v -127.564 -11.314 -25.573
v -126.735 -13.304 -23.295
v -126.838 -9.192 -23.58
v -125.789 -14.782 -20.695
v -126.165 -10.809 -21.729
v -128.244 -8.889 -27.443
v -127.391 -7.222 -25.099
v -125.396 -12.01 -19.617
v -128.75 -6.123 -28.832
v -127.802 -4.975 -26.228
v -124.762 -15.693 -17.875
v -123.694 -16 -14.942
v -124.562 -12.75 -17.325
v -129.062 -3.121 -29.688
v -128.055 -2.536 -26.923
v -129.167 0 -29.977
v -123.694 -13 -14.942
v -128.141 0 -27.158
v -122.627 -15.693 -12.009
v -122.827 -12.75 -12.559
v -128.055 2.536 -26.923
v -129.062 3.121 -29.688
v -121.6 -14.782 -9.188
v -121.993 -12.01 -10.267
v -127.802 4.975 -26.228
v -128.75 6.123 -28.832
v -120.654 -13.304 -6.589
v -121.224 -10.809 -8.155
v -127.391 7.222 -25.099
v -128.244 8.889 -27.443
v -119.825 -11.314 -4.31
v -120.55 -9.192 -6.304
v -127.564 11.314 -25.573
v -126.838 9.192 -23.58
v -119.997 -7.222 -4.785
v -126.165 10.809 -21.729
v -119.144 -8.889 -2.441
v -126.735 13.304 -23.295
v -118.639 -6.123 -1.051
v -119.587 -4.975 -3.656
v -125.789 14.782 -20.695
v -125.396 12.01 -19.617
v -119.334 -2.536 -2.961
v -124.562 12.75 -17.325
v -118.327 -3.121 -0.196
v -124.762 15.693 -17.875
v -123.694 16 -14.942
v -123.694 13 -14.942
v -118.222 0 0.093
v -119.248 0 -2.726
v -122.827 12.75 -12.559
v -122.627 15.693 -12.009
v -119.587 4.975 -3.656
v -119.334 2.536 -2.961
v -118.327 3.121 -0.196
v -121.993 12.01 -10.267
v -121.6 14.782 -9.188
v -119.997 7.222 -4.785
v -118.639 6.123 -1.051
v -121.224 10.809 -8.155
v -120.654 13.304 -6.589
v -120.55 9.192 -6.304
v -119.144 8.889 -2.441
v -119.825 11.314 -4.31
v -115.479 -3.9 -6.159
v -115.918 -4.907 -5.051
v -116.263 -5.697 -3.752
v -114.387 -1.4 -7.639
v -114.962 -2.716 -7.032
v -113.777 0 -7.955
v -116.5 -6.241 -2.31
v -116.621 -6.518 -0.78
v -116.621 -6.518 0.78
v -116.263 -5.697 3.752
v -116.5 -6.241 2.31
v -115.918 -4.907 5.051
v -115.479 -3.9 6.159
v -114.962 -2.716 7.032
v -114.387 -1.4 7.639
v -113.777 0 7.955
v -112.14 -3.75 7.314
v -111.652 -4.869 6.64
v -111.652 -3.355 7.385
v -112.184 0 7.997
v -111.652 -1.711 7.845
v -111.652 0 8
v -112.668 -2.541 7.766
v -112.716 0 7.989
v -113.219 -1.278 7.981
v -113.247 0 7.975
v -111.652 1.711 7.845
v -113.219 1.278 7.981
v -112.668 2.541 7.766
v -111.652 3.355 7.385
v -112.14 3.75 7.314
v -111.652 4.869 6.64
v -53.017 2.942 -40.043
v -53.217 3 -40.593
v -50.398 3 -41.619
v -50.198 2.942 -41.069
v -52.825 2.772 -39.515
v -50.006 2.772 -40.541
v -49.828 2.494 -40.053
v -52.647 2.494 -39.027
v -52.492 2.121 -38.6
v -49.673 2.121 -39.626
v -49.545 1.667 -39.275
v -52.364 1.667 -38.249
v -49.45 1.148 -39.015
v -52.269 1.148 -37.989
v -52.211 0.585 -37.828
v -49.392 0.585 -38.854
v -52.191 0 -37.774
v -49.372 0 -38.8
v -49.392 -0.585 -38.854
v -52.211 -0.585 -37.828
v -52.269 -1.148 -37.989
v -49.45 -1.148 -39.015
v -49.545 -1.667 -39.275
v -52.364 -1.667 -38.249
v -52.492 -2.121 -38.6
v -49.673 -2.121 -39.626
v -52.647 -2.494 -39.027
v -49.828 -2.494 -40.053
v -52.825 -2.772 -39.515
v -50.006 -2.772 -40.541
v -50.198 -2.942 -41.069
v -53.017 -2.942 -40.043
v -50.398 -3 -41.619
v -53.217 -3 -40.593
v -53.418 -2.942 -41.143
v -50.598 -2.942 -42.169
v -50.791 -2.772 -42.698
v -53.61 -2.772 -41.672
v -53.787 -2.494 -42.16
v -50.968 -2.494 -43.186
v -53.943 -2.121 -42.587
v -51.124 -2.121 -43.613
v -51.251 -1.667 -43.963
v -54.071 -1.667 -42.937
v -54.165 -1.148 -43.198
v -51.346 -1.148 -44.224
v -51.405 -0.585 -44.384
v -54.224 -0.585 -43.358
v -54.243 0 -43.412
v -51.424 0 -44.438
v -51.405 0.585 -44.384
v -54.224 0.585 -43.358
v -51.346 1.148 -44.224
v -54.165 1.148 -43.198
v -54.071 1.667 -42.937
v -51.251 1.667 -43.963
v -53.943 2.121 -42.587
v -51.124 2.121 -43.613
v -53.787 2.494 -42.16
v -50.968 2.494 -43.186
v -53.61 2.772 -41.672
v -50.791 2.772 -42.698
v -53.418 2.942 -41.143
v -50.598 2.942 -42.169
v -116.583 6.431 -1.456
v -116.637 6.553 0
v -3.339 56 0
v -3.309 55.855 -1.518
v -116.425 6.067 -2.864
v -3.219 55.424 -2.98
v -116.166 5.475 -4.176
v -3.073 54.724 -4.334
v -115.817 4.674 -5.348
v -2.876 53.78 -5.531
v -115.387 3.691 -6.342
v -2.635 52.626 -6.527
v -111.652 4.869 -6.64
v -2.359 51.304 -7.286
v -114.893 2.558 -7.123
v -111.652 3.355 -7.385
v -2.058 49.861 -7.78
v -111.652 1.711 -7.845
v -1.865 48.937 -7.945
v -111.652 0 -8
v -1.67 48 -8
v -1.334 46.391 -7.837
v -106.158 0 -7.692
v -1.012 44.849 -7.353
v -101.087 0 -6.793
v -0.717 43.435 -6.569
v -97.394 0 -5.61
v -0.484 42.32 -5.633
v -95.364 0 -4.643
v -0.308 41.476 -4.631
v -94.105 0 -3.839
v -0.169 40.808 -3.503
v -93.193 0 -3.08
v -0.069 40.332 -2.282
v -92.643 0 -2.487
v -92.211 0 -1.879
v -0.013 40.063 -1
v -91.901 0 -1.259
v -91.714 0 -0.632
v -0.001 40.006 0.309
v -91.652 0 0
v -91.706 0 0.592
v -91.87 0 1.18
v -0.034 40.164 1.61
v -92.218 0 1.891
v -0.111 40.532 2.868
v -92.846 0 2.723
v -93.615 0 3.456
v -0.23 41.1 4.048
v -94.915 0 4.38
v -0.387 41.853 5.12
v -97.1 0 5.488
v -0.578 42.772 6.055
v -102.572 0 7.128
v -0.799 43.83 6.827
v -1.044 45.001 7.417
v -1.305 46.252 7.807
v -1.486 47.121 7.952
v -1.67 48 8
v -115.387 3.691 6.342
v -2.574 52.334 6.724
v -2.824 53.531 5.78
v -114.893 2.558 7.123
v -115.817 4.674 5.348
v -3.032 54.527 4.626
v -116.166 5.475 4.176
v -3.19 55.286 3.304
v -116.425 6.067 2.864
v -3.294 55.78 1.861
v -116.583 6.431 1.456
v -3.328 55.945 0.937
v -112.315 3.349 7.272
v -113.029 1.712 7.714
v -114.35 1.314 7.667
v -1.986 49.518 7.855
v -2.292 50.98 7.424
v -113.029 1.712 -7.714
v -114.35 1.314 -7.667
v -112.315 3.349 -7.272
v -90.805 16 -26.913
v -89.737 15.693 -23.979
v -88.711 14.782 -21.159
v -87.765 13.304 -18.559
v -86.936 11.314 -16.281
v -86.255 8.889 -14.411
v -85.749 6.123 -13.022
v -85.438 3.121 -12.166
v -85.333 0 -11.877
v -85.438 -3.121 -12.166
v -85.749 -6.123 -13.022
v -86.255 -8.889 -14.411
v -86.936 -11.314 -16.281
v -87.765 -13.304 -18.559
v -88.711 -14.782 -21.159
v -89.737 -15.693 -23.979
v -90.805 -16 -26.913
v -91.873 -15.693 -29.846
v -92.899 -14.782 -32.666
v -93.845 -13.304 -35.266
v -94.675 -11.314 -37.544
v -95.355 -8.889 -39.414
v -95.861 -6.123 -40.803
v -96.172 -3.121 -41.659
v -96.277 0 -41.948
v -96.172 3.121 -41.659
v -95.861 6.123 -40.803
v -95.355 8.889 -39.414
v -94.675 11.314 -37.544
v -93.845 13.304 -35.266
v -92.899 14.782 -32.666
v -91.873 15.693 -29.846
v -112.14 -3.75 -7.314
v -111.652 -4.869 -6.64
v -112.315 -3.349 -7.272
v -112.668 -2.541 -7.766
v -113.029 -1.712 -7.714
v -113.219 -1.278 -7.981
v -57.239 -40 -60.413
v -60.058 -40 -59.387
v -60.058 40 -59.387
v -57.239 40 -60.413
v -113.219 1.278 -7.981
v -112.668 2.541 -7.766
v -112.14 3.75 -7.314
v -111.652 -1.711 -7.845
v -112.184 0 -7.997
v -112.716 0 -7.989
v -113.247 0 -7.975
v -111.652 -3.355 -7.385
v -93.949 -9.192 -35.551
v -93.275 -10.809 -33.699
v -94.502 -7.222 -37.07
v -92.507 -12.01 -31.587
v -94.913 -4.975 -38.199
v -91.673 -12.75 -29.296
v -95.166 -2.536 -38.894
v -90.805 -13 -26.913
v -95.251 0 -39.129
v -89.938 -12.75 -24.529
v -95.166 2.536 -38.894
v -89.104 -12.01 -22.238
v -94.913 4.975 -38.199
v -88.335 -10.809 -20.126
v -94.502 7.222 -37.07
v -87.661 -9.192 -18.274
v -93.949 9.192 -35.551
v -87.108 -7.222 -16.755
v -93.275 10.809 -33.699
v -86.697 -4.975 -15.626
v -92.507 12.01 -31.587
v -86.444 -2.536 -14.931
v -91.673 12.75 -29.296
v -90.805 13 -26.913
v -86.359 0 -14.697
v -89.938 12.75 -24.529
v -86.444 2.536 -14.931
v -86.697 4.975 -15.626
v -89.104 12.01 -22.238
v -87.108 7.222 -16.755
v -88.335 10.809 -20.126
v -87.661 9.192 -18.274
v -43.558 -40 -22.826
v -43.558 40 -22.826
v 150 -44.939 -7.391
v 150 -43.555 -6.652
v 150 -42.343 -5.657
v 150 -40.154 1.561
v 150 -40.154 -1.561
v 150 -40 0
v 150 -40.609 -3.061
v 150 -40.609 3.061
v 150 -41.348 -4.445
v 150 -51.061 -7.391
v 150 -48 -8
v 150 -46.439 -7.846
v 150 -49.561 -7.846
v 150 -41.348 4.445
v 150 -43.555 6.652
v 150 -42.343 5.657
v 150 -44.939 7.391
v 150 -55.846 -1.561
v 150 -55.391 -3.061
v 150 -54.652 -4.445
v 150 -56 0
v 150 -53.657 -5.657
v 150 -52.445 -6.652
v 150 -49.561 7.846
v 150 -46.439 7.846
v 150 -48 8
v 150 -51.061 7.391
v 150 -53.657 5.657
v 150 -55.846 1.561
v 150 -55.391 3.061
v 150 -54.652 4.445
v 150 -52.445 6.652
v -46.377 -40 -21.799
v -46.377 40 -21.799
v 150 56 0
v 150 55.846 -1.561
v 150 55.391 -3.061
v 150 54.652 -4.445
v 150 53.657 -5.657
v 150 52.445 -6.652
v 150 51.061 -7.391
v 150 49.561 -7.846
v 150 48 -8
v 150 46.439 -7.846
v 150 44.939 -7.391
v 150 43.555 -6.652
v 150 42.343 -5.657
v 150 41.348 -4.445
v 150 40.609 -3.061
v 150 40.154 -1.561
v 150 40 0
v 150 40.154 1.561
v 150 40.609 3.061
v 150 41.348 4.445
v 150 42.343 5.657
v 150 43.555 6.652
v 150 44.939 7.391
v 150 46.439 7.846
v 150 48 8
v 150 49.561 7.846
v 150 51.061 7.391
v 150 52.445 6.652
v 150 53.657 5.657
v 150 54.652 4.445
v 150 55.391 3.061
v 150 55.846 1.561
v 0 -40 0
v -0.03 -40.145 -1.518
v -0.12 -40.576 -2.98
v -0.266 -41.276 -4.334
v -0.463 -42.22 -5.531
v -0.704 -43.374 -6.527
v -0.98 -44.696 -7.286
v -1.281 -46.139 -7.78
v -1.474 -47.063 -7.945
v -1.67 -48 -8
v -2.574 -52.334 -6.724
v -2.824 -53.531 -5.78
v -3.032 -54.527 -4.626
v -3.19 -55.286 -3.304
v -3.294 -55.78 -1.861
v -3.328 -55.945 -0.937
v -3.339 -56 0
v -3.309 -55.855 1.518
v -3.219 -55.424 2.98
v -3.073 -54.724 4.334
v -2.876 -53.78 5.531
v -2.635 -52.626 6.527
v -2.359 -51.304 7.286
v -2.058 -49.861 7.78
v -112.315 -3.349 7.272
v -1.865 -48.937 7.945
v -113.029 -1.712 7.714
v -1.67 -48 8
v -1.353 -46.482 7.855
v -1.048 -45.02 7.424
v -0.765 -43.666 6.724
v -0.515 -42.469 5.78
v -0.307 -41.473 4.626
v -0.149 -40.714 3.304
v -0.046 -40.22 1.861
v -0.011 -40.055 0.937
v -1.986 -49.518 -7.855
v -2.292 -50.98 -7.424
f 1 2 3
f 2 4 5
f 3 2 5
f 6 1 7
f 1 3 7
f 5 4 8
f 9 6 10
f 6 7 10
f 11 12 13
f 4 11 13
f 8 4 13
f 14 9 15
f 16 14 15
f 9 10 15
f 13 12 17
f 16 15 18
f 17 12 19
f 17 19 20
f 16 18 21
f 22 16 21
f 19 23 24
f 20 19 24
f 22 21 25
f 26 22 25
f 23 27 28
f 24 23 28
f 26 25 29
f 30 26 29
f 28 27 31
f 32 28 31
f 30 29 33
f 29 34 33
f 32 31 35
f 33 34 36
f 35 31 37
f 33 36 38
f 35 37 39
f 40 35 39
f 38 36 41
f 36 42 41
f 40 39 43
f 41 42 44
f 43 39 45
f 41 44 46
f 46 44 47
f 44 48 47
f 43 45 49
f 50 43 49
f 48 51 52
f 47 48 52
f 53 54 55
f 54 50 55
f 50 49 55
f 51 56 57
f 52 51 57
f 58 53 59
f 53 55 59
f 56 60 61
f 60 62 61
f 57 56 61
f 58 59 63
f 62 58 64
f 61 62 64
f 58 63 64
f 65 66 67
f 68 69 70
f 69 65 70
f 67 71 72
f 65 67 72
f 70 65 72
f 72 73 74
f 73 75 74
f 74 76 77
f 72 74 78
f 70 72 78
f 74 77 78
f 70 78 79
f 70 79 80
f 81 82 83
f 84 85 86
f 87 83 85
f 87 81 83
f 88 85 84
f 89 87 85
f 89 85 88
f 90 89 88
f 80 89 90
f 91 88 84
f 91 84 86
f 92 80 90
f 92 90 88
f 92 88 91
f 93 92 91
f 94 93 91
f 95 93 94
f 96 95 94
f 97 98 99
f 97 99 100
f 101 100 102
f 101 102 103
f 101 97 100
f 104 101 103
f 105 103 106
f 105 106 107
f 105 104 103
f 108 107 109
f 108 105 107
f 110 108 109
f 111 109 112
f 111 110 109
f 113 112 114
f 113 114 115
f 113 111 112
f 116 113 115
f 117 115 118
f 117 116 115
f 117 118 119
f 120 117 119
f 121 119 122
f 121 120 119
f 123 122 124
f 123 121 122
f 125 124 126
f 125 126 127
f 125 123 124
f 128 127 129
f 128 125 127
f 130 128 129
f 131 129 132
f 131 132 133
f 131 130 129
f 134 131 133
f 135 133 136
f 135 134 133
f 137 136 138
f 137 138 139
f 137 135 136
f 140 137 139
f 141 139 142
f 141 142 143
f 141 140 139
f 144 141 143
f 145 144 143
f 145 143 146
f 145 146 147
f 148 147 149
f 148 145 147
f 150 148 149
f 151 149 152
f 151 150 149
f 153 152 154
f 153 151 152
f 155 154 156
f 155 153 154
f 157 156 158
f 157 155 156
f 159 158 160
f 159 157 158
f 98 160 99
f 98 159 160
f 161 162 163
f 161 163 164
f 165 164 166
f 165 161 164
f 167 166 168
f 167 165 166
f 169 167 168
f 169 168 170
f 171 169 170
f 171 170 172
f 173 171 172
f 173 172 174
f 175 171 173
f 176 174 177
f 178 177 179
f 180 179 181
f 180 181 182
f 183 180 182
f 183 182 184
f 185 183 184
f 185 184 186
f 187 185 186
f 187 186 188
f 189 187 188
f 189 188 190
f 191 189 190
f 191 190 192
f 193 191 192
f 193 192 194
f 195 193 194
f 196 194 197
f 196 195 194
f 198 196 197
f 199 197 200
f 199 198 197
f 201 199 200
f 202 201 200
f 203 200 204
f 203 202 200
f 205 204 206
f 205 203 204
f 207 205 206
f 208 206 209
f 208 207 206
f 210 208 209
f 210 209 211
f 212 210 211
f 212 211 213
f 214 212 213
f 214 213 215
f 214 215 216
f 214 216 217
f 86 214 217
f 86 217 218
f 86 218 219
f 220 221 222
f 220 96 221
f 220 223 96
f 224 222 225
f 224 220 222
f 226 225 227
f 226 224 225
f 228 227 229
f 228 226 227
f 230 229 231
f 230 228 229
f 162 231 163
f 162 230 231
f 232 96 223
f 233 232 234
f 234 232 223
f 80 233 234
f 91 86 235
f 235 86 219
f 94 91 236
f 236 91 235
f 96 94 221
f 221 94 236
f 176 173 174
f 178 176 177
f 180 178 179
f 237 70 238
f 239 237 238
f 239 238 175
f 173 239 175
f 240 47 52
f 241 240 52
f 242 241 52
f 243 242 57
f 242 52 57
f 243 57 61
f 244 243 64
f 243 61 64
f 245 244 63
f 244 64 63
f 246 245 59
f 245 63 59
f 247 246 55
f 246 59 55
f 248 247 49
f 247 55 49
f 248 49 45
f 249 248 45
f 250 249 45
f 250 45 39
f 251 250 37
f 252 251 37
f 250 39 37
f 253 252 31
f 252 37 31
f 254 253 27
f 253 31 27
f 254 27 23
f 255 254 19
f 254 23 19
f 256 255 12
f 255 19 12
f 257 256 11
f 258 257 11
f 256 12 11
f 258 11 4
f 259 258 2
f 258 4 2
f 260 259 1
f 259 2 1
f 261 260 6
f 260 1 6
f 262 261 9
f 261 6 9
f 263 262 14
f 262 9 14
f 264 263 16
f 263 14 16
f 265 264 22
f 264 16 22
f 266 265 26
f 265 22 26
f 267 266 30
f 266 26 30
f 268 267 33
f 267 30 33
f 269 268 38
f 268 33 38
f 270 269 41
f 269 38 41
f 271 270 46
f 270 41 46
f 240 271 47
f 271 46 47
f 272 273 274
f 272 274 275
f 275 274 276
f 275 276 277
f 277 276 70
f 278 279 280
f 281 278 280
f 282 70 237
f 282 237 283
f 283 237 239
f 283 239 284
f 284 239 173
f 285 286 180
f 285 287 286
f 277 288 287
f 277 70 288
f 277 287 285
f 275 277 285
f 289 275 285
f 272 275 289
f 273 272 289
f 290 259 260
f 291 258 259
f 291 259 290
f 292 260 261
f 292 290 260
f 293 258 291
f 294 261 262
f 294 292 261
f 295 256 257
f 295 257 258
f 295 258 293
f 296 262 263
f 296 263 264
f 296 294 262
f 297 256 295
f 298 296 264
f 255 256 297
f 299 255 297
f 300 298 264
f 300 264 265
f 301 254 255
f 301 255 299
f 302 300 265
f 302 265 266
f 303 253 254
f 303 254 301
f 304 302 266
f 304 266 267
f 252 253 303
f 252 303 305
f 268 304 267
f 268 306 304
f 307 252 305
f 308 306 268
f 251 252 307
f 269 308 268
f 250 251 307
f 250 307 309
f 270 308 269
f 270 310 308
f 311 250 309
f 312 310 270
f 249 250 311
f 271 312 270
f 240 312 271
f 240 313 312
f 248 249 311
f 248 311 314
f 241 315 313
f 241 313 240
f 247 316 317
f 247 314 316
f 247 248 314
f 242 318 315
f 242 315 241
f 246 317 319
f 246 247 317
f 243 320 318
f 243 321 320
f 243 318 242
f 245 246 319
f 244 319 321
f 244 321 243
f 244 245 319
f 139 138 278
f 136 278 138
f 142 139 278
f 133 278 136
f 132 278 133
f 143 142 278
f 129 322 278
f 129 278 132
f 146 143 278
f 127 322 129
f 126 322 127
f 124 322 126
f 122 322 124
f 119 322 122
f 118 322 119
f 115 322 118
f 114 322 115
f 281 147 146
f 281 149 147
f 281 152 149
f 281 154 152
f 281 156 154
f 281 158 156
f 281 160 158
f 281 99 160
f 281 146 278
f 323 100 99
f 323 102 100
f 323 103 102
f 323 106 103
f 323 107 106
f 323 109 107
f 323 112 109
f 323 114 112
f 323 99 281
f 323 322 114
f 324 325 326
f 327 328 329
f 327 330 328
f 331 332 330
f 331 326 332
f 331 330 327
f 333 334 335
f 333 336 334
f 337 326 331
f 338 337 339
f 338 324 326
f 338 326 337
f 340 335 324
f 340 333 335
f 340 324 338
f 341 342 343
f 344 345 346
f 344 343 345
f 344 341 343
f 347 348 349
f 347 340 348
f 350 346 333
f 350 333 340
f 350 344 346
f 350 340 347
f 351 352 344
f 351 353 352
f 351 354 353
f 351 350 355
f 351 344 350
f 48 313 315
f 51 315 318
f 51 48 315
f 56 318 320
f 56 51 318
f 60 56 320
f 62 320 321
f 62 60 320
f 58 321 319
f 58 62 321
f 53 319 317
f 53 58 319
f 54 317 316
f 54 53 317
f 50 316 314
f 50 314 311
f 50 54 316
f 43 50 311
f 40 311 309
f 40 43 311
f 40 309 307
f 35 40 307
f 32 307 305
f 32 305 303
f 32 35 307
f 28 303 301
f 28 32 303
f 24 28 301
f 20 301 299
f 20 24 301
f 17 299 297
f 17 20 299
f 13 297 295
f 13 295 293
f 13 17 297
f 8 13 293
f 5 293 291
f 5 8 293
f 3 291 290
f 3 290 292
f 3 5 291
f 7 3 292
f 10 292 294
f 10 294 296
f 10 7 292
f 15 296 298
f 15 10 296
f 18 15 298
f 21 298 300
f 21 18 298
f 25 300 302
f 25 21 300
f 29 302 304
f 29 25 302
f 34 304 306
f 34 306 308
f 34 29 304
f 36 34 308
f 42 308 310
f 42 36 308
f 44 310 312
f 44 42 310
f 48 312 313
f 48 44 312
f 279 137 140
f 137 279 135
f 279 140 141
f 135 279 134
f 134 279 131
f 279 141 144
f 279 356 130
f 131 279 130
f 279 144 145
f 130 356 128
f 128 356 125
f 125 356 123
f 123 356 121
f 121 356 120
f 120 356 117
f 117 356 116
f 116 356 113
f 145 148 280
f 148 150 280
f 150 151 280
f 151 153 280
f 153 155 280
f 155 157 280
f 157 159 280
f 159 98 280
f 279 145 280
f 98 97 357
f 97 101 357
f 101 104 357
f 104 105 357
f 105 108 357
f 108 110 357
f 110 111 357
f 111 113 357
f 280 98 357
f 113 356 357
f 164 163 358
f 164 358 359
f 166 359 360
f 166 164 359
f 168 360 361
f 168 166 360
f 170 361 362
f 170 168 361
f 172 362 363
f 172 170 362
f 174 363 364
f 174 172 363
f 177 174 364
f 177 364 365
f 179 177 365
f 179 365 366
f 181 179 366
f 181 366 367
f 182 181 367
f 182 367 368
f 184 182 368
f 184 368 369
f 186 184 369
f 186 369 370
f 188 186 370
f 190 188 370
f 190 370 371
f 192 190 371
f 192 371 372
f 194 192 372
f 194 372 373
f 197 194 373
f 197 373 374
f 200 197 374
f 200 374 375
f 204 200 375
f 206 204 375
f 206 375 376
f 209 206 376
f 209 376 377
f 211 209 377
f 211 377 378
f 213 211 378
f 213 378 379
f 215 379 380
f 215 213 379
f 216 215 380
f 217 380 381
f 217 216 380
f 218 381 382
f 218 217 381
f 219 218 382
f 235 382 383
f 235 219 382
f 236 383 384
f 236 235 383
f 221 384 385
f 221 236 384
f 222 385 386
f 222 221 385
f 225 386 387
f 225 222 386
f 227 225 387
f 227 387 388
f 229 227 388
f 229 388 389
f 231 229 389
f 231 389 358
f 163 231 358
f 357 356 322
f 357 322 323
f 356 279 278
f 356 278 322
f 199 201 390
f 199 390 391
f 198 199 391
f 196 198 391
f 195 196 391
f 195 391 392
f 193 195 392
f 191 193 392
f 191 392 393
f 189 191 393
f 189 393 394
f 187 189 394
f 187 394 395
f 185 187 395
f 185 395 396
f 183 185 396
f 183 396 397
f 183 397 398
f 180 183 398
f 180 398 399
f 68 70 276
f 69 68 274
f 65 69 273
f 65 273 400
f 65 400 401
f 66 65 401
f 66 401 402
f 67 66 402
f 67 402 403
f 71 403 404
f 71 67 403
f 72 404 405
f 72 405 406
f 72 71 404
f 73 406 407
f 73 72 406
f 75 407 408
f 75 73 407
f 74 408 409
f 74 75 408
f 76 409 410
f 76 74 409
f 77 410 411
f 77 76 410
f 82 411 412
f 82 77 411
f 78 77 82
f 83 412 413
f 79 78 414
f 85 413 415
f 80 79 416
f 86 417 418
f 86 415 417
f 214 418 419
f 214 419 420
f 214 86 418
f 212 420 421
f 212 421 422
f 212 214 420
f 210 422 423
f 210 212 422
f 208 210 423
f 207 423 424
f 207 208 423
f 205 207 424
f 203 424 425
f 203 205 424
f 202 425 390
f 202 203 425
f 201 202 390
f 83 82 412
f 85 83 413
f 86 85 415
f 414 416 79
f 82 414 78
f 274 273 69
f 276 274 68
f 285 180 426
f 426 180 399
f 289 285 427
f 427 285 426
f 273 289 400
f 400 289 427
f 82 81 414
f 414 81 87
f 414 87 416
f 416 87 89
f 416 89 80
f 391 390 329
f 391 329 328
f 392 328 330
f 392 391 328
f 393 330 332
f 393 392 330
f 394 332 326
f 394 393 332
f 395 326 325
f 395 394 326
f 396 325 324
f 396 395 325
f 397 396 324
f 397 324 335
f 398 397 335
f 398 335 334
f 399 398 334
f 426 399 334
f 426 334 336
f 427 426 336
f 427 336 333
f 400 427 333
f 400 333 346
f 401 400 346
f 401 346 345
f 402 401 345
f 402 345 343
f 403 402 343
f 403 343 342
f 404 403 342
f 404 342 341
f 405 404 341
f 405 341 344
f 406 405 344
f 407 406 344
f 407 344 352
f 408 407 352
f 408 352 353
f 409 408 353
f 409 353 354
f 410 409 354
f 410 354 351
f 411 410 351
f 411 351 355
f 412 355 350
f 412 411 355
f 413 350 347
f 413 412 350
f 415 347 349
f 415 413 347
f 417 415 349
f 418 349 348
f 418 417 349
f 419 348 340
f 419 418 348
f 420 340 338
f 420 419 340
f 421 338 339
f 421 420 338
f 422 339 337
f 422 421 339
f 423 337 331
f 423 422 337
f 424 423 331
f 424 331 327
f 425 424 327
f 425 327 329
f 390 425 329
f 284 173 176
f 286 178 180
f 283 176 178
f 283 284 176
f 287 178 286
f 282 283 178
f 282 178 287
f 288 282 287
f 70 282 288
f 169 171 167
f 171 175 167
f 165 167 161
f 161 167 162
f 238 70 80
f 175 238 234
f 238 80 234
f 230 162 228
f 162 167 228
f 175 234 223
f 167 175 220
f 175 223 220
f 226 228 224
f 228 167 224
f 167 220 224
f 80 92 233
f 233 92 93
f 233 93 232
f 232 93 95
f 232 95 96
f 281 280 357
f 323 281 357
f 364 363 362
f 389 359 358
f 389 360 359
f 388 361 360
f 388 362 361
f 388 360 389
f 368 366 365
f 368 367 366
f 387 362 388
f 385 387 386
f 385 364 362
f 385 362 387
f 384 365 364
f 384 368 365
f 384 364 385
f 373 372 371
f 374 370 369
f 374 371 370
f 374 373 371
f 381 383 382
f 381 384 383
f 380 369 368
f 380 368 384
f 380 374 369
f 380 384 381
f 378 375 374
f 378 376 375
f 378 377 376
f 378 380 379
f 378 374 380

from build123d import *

# Parameters (mm, degrees)
F2_R      = 8
F8_R      = 16
F8_R_2    = 13
F9_DEPTH  = 35
F12_W     = 80
F12_H     = 40
F12_R     = 3
F13_DEPTH = 3


with BuildPart() as f3:
    # F3: sweep along a path in F0
    with BuildLine(Plane.XY) as f3_path:
        Line((150, -48), (-1.6696972202, -48))
        Line((-1.6696972202, -48), (-113.4366041888, 0.7790772738))
    # F2 (on line) → F3 (sweep)
    with BuildSketch(Plane.YZ.offset(150)):
        with Locations((-48, 0)):
            Circle(F2_R)
    sweep(path=f3_path.line, transition=Transition.RIGHT)

    # F4: sweep along a path in F0
    with BuildLine(Plane.XY) as f4_path:
        Line((150, 48), (-1.6696972202, 48))
        Line((-1.6696972202, 48), (-113.4366041888, -0.7790772738))
    # F2 (on line) → F4 (sweep)
    with BuildSketch(Plane.YZ.offset(150)):
        with Locations((48, 0)):
            Circle(F2_R)
    sweep(path=f4_path.line, transition=Transition.RIGHT)


with BuildPart() as f9:
    # F8 (on line) → F9 (new body)
    with BuildSketch(Plane(origin=(-104.4226389321, 0, 38.0067323548), x_dir=(0, 1, 0), z_dir=(0.9396926208, 0, -0.3420201433))):
        with Locations((0, -56.3466639198)):
            Circle(F8_R)
        with Locations((0, -56.3466639198)):
            Circle(F8_R_2, mode=Mode.SUBTRACT)
    extrude(amount=F9_DEPTH)


with BuildPart() as f13:
    # F12 (on offset) → F13 (new body)
    with BuildSketch(Plane(origin=(-33.9456923732, 0, 12.3552216054), x_dir=(0, 1, 0), z_dir=(0.9396926208, 0, -0.3420201433))):
        with Locations((0, -56.3466639198)):
            Rectangle(F12_W, F12_H)
        with Locations((0, -56.3466639198)):
            Circle(F12_R, mode=Mode.SUBTRACT)
    extrude(amount=F13_DEPTH)


solid = Compound([f3.part, f9.part, f13.part])
